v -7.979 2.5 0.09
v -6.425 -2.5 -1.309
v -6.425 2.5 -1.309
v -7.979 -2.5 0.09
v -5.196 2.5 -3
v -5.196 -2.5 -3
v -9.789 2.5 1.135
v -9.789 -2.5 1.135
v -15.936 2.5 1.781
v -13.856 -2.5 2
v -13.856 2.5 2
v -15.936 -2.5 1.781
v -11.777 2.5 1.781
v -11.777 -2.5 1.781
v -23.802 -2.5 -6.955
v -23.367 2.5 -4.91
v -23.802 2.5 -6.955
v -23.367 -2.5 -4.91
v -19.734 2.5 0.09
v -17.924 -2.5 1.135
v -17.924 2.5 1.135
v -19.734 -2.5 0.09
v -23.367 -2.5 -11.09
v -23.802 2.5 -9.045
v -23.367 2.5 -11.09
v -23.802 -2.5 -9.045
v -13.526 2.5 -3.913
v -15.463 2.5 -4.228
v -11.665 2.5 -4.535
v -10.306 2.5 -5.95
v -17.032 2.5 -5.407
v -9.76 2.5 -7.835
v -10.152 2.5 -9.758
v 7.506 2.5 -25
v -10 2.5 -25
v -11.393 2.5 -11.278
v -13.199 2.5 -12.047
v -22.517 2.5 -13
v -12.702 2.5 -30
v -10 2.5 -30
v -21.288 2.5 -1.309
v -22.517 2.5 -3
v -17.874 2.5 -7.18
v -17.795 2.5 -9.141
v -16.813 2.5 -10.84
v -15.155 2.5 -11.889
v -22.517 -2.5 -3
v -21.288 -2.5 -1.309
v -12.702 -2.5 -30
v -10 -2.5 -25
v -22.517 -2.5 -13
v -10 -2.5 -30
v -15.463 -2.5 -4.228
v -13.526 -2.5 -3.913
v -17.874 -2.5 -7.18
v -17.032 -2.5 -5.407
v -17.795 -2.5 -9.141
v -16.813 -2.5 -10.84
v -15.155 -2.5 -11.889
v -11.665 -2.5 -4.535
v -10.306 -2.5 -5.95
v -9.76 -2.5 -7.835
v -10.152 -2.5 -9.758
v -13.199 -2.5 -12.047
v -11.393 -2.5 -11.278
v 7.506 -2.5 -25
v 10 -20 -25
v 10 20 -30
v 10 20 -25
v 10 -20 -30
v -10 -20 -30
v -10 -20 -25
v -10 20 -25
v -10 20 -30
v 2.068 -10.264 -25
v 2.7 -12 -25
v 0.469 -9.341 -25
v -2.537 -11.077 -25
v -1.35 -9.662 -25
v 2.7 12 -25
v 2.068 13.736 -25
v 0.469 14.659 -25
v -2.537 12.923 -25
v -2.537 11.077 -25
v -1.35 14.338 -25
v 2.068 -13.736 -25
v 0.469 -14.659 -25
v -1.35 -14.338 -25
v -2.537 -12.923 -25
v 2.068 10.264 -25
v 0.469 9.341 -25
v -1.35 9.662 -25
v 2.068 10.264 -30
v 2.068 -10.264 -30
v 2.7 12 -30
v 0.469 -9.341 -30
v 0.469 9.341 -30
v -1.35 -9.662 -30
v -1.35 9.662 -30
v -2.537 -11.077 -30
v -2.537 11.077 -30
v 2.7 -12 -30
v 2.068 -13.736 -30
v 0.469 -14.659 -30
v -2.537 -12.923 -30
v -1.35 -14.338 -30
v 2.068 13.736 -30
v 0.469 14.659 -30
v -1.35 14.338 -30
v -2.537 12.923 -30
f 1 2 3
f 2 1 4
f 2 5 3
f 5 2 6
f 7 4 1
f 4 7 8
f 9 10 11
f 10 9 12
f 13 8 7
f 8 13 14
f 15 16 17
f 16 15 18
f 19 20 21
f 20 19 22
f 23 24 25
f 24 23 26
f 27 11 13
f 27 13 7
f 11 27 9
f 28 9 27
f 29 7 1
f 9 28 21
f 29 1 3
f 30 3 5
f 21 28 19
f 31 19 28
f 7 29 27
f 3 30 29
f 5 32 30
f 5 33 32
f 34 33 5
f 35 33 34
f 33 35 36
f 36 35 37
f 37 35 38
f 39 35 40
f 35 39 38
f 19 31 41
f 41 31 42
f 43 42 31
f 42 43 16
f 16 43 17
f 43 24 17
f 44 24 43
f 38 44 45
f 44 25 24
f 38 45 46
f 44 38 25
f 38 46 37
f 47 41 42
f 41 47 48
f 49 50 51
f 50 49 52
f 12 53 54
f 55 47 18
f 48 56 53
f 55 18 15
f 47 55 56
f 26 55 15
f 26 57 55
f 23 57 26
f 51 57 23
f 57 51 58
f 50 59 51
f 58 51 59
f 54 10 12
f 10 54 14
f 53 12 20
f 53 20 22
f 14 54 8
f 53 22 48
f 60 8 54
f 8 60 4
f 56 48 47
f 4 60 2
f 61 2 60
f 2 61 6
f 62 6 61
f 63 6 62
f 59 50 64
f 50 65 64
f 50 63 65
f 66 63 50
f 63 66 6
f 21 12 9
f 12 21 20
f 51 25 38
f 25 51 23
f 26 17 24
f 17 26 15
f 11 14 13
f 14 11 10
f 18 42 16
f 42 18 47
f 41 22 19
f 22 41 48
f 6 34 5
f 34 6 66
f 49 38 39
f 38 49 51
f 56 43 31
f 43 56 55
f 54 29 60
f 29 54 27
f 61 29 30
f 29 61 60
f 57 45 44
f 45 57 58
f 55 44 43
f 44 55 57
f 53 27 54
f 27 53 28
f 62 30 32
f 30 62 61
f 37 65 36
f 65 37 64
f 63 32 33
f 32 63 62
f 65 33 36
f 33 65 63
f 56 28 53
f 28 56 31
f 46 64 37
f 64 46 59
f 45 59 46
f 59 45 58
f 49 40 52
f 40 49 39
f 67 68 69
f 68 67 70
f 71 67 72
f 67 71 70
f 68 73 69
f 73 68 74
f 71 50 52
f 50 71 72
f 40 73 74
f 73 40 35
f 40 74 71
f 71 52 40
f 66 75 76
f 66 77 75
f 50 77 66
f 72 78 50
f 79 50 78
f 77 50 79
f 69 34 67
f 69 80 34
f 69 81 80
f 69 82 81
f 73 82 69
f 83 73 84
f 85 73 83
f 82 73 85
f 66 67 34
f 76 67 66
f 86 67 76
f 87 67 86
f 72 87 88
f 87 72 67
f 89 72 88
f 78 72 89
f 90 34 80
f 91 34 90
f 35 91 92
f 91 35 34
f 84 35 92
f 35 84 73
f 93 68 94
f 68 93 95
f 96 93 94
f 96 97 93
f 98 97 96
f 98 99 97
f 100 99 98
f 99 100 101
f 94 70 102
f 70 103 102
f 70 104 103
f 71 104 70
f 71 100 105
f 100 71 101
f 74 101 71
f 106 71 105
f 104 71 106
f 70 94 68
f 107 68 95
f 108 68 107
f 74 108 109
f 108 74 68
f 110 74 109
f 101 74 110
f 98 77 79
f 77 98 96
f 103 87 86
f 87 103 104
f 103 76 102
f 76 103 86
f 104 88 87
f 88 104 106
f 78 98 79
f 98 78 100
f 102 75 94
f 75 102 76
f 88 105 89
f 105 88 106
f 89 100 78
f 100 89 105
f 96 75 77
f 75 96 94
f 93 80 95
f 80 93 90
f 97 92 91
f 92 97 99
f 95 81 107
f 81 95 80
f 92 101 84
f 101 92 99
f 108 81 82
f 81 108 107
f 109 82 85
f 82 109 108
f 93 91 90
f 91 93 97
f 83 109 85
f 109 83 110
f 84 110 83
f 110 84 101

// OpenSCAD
// file: Rook_Config.scad
// Rook 3D Printer Configuration
// Created By Jeffrey Olijar 
// Jolijar@gmail.com

// Layer Height
LH = 0.38;

// 608 skate bearing
Bearing_OD = 22.5; 
Bearing_ID = 8;
Bearing_H = 7;

// M3 Nut Diameter
N3 = 7.5;

// M4 Screw Hole Diameter
M4 = 4;

// M5 Screw Hole Diameter
M5 = 5.4;

// M8 Rod Diameter (configure for a tight fit)
M8 = 8.2;

// M8 Nut Diameter
N8 = 15.5;

//LM8UU Bearing
LBD = 15.4; // Diameter
LBH = 25; // Height
LBI = 8;  // Inner Diameter

//Makergear Groovemount
GVO = 16.5; // Outside Diameter
GVI = 12.5;  // Inside Groove Diameter

// Distance Between Centers for X rods
DBCX = 70;
// main file
// Rook 3D Printer 
// Rook_Y_Idler
// Created By Jeffrey Olijar 
// Jolijar@gmail.com
// Revision 1.00
// 1 x required 

include <Rook_Config.scad> 


module Rook_Y_Idler(){
rotate(a=[90,0,0]){
difference(){ 
union(){
translate (v=[0,-27.5,0]){ 
		cube(size =[20,5,40], center = true); 
}


rotate(a=[0,0,30])translate (v=[-16,0,0]){
difference(){ 
union(){
	cylinder(h=5,r=10, center = true);
	translate (v=[0,-15,0]){ 
		cube(size =[20,30,5], center = true); 

}}
union(){
translate(v=[0,0,0]){
	cylinder(h=100,r=M8/2, center = true);
rotate(a=[0,0,-30])
translate (v=[12,-32,0]){ 
		cube(size =[30,20,40], center = true); 



}
}
}




}
}



}






union(){
rotate(a=[90,0,0])translate(v=[0,12,0]){
	cylinder(h=100,r=M5/2, center = true);
}
rotate(a=[90,0,0])translate(v=[0,-12,0]){
	cylinder(h=100,r=M5/2, center = true);
}


}}


}}

Rook_Y_Idler();
